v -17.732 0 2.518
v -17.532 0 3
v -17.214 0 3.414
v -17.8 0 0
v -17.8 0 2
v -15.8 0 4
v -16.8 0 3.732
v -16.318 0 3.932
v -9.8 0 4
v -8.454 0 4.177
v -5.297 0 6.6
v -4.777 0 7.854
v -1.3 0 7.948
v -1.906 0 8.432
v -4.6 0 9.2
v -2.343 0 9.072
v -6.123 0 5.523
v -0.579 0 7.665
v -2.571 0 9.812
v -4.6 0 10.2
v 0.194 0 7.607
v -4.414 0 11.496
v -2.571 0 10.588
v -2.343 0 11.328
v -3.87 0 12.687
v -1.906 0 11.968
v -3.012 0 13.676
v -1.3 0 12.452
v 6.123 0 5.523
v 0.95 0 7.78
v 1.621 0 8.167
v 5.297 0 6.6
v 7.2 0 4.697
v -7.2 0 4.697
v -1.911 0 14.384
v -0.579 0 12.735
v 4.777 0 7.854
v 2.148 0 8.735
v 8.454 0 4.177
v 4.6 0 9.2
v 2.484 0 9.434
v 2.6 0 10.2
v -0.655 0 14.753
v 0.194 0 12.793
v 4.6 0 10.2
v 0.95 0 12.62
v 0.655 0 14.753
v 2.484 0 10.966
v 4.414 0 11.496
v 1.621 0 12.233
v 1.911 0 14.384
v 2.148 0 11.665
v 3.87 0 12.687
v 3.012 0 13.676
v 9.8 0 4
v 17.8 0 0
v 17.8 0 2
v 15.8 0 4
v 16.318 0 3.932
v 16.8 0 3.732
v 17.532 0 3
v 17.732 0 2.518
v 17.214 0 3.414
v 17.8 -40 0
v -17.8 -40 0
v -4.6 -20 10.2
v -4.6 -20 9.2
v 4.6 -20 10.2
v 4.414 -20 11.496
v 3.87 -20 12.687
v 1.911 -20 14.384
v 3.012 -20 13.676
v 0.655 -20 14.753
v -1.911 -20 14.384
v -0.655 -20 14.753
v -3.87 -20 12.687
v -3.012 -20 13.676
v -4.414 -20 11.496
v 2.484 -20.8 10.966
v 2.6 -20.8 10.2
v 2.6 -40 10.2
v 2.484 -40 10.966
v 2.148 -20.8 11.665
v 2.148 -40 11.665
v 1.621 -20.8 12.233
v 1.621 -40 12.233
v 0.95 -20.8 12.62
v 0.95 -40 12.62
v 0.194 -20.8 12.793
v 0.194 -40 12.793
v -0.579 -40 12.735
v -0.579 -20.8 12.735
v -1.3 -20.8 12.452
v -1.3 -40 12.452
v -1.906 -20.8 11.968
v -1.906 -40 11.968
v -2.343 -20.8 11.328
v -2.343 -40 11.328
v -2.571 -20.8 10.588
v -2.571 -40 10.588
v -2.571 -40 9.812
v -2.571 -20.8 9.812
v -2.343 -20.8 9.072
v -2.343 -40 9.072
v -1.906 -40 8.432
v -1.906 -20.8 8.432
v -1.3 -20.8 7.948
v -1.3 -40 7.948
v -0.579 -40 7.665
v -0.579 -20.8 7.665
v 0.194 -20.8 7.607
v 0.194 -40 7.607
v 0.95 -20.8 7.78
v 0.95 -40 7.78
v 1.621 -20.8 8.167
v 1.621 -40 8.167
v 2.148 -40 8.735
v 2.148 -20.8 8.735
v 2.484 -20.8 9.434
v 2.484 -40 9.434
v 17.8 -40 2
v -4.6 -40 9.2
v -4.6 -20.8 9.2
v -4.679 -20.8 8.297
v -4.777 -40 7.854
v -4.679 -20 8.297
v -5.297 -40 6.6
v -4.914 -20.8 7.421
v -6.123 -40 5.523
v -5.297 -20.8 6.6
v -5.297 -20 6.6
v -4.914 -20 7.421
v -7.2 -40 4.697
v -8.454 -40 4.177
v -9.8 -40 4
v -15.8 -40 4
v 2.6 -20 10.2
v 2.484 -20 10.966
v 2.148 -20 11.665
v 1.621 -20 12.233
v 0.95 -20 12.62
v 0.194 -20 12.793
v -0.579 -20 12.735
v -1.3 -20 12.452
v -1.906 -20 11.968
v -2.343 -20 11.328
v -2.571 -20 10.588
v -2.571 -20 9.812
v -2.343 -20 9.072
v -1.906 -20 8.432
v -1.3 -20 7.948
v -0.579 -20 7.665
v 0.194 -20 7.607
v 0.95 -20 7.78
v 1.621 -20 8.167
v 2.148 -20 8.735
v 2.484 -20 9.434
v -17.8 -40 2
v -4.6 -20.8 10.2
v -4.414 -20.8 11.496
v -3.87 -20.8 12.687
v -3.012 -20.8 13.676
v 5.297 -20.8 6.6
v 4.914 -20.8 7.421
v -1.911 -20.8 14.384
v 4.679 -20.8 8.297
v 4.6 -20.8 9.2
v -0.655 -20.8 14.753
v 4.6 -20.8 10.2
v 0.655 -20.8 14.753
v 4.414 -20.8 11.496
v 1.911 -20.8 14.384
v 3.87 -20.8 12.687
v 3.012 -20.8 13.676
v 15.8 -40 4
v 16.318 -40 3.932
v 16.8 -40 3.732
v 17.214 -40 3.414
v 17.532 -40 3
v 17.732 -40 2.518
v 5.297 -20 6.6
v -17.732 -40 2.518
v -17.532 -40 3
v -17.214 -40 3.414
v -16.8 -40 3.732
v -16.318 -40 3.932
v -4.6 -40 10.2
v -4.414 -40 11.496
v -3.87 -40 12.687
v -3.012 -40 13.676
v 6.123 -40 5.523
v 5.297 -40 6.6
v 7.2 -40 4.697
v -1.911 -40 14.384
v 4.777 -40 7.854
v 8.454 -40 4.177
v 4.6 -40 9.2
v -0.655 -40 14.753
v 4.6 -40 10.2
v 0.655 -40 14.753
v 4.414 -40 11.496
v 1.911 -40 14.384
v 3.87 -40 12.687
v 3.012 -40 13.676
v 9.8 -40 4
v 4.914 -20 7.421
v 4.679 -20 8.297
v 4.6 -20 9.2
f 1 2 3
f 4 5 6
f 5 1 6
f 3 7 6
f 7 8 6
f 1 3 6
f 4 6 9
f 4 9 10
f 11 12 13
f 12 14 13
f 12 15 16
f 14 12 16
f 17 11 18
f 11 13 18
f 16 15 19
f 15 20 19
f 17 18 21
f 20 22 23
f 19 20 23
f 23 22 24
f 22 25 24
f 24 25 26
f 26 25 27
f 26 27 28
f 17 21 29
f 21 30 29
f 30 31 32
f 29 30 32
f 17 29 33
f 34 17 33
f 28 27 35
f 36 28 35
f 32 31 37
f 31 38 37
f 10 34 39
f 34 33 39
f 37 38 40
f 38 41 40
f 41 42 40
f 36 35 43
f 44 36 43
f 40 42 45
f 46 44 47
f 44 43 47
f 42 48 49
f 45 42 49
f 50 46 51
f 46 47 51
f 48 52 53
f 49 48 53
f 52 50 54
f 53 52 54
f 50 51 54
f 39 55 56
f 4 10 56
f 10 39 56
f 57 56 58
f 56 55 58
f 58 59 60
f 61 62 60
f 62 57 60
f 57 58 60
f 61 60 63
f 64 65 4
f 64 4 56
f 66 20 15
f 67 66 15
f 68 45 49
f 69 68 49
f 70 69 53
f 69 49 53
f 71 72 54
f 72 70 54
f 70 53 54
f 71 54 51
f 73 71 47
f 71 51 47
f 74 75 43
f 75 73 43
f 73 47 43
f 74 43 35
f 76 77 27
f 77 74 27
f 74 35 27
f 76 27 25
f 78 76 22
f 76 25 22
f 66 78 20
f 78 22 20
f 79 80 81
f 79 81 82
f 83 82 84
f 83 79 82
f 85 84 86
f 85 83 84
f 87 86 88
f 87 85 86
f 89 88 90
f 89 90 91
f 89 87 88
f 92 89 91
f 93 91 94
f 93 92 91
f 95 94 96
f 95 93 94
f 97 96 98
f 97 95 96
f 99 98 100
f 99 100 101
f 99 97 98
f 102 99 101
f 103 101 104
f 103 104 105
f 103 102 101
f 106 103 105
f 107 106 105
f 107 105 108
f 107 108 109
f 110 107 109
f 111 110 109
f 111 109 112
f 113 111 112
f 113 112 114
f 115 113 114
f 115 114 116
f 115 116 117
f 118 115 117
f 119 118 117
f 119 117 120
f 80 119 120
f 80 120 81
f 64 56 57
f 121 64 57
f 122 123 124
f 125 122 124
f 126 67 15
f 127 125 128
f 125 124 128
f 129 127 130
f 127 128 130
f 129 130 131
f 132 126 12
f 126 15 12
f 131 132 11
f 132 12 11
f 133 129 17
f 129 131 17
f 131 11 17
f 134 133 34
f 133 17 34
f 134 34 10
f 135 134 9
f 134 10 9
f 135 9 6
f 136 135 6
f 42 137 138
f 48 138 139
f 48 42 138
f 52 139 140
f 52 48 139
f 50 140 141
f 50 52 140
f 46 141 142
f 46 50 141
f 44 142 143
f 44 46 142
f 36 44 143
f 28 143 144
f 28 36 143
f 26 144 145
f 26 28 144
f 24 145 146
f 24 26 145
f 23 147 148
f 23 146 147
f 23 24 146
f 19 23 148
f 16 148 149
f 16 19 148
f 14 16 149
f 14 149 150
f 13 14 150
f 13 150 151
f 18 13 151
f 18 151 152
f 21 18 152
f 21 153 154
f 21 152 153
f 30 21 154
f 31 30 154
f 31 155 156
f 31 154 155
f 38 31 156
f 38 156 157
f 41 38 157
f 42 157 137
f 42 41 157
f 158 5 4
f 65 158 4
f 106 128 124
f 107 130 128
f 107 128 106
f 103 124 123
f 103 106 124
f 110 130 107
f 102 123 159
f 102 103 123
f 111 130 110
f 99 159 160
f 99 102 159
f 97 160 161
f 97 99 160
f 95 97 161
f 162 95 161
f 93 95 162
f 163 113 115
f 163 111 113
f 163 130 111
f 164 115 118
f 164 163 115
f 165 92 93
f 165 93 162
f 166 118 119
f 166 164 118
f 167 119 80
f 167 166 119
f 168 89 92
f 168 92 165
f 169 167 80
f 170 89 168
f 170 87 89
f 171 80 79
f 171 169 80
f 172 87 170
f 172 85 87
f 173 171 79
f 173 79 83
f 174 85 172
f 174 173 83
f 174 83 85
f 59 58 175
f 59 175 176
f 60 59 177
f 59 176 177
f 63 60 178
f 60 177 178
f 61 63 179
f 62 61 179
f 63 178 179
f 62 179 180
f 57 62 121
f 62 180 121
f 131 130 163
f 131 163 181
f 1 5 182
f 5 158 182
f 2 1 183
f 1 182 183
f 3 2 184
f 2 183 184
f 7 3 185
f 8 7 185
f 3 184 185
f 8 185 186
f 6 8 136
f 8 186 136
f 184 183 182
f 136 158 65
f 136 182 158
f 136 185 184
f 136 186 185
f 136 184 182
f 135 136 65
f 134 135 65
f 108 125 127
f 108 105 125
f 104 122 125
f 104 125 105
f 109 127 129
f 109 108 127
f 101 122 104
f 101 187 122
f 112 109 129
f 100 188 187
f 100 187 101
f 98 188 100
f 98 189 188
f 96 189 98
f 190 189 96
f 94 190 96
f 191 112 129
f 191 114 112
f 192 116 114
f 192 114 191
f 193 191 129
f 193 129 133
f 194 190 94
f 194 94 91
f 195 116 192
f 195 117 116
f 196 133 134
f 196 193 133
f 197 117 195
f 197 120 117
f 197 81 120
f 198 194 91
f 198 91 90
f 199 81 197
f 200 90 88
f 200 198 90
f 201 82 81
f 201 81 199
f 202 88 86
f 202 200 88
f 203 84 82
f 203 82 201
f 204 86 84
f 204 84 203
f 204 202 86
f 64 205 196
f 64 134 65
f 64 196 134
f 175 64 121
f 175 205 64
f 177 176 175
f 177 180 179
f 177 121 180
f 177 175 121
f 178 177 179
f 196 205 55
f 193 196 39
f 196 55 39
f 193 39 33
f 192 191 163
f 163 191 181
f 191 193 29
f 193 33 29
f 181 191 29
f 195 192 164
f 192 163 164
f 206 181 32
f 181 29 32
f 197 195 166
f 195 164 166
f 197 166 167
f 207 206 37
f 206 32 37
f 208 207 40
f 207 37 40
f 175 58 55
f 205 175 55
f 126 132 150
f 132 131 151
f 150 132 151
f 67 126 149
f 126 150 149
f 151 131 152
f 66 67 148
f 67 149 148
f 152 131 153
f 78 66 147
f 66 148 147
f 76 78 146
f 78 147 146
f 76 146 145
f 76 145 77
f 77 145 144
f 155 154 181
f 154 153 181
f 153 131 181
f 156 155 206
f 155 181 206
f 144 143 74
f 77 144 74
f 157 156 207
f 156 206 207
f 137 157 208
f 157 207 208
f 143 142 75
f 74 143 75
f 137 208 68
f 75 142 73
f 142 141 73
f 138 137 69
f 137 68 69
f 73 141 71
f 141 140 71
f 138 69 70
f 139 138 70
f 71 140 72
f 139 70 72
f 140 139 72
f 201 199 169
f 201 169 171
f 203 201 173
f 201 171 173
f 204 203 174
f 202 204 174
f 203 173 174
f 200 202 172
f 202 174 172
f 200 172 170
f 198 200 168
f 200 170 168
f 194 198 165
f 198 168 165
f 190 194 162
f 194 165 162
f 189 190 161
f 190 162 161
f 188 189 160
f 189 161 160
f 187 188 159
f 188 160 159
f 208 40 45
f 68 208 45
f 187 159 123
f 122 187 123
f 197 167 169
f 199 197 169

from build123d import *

# Parameters (mm, degrees)
F0_R     = 2.6
F1_DEPTH = 40
F2_W     = 0.8
F2_H     = 8.2
F3_DEPTH = 35.601
F4_R     = 2


with BuildPart() as f1:
    # F0 (on Front) → F1 (new body)
    with BuildSketch(Plane.XZ):
        with BuildLine():
            Line((-17.8, 4), (-17.8, 0))
            Line((-17.8, 0), (17.8, 0))
            Line((17.8, 0), (17.8, 4))
            Line((17.8, 4), (9.8, 4))
            ThreePointArc((9.8, 4), (6.123045, 5.523045), (4.6, 9.2))
            Line((4.6, 9.2), (4.6, 10.2))
            ThreePointArc((4.6, 10.2), (0, 14.8), (-4.6, 10.2))
            Line((-4.6, 10.2), (-4.6, 9.2))
            ThreePointArc((-4.6, 9.2), (-6.123045, 5.523045), (-9.8, 4))
            Line((-9.8, 4), (-17.8, 4))
        make_face()
        with Locations((0, 10.2)):
            Circle(F0_R, mode=Mode.SUBTRACT)
    extrude(amount=F1_DEPTH)

    # F2 (on face) → F3 (cut, through all)
    with BuildSketch(Plane.YZ.offset(17.8)):
        with Locations((-20.4, 10.7)):
            Rectangle(F2_W, F2_H)
    extrude(amount=-F3_DEPTH, mode=Mode.SUBTRACT)

    # F4
    f4_edges = [f1.edges().sort_by_distance(p)[0] for p in [
        (-17.8, -20, 4),
        (17.8, -20, 4),
    ]]
    fillet(f4_edges, radius=F4_R)


solid = f1.part
